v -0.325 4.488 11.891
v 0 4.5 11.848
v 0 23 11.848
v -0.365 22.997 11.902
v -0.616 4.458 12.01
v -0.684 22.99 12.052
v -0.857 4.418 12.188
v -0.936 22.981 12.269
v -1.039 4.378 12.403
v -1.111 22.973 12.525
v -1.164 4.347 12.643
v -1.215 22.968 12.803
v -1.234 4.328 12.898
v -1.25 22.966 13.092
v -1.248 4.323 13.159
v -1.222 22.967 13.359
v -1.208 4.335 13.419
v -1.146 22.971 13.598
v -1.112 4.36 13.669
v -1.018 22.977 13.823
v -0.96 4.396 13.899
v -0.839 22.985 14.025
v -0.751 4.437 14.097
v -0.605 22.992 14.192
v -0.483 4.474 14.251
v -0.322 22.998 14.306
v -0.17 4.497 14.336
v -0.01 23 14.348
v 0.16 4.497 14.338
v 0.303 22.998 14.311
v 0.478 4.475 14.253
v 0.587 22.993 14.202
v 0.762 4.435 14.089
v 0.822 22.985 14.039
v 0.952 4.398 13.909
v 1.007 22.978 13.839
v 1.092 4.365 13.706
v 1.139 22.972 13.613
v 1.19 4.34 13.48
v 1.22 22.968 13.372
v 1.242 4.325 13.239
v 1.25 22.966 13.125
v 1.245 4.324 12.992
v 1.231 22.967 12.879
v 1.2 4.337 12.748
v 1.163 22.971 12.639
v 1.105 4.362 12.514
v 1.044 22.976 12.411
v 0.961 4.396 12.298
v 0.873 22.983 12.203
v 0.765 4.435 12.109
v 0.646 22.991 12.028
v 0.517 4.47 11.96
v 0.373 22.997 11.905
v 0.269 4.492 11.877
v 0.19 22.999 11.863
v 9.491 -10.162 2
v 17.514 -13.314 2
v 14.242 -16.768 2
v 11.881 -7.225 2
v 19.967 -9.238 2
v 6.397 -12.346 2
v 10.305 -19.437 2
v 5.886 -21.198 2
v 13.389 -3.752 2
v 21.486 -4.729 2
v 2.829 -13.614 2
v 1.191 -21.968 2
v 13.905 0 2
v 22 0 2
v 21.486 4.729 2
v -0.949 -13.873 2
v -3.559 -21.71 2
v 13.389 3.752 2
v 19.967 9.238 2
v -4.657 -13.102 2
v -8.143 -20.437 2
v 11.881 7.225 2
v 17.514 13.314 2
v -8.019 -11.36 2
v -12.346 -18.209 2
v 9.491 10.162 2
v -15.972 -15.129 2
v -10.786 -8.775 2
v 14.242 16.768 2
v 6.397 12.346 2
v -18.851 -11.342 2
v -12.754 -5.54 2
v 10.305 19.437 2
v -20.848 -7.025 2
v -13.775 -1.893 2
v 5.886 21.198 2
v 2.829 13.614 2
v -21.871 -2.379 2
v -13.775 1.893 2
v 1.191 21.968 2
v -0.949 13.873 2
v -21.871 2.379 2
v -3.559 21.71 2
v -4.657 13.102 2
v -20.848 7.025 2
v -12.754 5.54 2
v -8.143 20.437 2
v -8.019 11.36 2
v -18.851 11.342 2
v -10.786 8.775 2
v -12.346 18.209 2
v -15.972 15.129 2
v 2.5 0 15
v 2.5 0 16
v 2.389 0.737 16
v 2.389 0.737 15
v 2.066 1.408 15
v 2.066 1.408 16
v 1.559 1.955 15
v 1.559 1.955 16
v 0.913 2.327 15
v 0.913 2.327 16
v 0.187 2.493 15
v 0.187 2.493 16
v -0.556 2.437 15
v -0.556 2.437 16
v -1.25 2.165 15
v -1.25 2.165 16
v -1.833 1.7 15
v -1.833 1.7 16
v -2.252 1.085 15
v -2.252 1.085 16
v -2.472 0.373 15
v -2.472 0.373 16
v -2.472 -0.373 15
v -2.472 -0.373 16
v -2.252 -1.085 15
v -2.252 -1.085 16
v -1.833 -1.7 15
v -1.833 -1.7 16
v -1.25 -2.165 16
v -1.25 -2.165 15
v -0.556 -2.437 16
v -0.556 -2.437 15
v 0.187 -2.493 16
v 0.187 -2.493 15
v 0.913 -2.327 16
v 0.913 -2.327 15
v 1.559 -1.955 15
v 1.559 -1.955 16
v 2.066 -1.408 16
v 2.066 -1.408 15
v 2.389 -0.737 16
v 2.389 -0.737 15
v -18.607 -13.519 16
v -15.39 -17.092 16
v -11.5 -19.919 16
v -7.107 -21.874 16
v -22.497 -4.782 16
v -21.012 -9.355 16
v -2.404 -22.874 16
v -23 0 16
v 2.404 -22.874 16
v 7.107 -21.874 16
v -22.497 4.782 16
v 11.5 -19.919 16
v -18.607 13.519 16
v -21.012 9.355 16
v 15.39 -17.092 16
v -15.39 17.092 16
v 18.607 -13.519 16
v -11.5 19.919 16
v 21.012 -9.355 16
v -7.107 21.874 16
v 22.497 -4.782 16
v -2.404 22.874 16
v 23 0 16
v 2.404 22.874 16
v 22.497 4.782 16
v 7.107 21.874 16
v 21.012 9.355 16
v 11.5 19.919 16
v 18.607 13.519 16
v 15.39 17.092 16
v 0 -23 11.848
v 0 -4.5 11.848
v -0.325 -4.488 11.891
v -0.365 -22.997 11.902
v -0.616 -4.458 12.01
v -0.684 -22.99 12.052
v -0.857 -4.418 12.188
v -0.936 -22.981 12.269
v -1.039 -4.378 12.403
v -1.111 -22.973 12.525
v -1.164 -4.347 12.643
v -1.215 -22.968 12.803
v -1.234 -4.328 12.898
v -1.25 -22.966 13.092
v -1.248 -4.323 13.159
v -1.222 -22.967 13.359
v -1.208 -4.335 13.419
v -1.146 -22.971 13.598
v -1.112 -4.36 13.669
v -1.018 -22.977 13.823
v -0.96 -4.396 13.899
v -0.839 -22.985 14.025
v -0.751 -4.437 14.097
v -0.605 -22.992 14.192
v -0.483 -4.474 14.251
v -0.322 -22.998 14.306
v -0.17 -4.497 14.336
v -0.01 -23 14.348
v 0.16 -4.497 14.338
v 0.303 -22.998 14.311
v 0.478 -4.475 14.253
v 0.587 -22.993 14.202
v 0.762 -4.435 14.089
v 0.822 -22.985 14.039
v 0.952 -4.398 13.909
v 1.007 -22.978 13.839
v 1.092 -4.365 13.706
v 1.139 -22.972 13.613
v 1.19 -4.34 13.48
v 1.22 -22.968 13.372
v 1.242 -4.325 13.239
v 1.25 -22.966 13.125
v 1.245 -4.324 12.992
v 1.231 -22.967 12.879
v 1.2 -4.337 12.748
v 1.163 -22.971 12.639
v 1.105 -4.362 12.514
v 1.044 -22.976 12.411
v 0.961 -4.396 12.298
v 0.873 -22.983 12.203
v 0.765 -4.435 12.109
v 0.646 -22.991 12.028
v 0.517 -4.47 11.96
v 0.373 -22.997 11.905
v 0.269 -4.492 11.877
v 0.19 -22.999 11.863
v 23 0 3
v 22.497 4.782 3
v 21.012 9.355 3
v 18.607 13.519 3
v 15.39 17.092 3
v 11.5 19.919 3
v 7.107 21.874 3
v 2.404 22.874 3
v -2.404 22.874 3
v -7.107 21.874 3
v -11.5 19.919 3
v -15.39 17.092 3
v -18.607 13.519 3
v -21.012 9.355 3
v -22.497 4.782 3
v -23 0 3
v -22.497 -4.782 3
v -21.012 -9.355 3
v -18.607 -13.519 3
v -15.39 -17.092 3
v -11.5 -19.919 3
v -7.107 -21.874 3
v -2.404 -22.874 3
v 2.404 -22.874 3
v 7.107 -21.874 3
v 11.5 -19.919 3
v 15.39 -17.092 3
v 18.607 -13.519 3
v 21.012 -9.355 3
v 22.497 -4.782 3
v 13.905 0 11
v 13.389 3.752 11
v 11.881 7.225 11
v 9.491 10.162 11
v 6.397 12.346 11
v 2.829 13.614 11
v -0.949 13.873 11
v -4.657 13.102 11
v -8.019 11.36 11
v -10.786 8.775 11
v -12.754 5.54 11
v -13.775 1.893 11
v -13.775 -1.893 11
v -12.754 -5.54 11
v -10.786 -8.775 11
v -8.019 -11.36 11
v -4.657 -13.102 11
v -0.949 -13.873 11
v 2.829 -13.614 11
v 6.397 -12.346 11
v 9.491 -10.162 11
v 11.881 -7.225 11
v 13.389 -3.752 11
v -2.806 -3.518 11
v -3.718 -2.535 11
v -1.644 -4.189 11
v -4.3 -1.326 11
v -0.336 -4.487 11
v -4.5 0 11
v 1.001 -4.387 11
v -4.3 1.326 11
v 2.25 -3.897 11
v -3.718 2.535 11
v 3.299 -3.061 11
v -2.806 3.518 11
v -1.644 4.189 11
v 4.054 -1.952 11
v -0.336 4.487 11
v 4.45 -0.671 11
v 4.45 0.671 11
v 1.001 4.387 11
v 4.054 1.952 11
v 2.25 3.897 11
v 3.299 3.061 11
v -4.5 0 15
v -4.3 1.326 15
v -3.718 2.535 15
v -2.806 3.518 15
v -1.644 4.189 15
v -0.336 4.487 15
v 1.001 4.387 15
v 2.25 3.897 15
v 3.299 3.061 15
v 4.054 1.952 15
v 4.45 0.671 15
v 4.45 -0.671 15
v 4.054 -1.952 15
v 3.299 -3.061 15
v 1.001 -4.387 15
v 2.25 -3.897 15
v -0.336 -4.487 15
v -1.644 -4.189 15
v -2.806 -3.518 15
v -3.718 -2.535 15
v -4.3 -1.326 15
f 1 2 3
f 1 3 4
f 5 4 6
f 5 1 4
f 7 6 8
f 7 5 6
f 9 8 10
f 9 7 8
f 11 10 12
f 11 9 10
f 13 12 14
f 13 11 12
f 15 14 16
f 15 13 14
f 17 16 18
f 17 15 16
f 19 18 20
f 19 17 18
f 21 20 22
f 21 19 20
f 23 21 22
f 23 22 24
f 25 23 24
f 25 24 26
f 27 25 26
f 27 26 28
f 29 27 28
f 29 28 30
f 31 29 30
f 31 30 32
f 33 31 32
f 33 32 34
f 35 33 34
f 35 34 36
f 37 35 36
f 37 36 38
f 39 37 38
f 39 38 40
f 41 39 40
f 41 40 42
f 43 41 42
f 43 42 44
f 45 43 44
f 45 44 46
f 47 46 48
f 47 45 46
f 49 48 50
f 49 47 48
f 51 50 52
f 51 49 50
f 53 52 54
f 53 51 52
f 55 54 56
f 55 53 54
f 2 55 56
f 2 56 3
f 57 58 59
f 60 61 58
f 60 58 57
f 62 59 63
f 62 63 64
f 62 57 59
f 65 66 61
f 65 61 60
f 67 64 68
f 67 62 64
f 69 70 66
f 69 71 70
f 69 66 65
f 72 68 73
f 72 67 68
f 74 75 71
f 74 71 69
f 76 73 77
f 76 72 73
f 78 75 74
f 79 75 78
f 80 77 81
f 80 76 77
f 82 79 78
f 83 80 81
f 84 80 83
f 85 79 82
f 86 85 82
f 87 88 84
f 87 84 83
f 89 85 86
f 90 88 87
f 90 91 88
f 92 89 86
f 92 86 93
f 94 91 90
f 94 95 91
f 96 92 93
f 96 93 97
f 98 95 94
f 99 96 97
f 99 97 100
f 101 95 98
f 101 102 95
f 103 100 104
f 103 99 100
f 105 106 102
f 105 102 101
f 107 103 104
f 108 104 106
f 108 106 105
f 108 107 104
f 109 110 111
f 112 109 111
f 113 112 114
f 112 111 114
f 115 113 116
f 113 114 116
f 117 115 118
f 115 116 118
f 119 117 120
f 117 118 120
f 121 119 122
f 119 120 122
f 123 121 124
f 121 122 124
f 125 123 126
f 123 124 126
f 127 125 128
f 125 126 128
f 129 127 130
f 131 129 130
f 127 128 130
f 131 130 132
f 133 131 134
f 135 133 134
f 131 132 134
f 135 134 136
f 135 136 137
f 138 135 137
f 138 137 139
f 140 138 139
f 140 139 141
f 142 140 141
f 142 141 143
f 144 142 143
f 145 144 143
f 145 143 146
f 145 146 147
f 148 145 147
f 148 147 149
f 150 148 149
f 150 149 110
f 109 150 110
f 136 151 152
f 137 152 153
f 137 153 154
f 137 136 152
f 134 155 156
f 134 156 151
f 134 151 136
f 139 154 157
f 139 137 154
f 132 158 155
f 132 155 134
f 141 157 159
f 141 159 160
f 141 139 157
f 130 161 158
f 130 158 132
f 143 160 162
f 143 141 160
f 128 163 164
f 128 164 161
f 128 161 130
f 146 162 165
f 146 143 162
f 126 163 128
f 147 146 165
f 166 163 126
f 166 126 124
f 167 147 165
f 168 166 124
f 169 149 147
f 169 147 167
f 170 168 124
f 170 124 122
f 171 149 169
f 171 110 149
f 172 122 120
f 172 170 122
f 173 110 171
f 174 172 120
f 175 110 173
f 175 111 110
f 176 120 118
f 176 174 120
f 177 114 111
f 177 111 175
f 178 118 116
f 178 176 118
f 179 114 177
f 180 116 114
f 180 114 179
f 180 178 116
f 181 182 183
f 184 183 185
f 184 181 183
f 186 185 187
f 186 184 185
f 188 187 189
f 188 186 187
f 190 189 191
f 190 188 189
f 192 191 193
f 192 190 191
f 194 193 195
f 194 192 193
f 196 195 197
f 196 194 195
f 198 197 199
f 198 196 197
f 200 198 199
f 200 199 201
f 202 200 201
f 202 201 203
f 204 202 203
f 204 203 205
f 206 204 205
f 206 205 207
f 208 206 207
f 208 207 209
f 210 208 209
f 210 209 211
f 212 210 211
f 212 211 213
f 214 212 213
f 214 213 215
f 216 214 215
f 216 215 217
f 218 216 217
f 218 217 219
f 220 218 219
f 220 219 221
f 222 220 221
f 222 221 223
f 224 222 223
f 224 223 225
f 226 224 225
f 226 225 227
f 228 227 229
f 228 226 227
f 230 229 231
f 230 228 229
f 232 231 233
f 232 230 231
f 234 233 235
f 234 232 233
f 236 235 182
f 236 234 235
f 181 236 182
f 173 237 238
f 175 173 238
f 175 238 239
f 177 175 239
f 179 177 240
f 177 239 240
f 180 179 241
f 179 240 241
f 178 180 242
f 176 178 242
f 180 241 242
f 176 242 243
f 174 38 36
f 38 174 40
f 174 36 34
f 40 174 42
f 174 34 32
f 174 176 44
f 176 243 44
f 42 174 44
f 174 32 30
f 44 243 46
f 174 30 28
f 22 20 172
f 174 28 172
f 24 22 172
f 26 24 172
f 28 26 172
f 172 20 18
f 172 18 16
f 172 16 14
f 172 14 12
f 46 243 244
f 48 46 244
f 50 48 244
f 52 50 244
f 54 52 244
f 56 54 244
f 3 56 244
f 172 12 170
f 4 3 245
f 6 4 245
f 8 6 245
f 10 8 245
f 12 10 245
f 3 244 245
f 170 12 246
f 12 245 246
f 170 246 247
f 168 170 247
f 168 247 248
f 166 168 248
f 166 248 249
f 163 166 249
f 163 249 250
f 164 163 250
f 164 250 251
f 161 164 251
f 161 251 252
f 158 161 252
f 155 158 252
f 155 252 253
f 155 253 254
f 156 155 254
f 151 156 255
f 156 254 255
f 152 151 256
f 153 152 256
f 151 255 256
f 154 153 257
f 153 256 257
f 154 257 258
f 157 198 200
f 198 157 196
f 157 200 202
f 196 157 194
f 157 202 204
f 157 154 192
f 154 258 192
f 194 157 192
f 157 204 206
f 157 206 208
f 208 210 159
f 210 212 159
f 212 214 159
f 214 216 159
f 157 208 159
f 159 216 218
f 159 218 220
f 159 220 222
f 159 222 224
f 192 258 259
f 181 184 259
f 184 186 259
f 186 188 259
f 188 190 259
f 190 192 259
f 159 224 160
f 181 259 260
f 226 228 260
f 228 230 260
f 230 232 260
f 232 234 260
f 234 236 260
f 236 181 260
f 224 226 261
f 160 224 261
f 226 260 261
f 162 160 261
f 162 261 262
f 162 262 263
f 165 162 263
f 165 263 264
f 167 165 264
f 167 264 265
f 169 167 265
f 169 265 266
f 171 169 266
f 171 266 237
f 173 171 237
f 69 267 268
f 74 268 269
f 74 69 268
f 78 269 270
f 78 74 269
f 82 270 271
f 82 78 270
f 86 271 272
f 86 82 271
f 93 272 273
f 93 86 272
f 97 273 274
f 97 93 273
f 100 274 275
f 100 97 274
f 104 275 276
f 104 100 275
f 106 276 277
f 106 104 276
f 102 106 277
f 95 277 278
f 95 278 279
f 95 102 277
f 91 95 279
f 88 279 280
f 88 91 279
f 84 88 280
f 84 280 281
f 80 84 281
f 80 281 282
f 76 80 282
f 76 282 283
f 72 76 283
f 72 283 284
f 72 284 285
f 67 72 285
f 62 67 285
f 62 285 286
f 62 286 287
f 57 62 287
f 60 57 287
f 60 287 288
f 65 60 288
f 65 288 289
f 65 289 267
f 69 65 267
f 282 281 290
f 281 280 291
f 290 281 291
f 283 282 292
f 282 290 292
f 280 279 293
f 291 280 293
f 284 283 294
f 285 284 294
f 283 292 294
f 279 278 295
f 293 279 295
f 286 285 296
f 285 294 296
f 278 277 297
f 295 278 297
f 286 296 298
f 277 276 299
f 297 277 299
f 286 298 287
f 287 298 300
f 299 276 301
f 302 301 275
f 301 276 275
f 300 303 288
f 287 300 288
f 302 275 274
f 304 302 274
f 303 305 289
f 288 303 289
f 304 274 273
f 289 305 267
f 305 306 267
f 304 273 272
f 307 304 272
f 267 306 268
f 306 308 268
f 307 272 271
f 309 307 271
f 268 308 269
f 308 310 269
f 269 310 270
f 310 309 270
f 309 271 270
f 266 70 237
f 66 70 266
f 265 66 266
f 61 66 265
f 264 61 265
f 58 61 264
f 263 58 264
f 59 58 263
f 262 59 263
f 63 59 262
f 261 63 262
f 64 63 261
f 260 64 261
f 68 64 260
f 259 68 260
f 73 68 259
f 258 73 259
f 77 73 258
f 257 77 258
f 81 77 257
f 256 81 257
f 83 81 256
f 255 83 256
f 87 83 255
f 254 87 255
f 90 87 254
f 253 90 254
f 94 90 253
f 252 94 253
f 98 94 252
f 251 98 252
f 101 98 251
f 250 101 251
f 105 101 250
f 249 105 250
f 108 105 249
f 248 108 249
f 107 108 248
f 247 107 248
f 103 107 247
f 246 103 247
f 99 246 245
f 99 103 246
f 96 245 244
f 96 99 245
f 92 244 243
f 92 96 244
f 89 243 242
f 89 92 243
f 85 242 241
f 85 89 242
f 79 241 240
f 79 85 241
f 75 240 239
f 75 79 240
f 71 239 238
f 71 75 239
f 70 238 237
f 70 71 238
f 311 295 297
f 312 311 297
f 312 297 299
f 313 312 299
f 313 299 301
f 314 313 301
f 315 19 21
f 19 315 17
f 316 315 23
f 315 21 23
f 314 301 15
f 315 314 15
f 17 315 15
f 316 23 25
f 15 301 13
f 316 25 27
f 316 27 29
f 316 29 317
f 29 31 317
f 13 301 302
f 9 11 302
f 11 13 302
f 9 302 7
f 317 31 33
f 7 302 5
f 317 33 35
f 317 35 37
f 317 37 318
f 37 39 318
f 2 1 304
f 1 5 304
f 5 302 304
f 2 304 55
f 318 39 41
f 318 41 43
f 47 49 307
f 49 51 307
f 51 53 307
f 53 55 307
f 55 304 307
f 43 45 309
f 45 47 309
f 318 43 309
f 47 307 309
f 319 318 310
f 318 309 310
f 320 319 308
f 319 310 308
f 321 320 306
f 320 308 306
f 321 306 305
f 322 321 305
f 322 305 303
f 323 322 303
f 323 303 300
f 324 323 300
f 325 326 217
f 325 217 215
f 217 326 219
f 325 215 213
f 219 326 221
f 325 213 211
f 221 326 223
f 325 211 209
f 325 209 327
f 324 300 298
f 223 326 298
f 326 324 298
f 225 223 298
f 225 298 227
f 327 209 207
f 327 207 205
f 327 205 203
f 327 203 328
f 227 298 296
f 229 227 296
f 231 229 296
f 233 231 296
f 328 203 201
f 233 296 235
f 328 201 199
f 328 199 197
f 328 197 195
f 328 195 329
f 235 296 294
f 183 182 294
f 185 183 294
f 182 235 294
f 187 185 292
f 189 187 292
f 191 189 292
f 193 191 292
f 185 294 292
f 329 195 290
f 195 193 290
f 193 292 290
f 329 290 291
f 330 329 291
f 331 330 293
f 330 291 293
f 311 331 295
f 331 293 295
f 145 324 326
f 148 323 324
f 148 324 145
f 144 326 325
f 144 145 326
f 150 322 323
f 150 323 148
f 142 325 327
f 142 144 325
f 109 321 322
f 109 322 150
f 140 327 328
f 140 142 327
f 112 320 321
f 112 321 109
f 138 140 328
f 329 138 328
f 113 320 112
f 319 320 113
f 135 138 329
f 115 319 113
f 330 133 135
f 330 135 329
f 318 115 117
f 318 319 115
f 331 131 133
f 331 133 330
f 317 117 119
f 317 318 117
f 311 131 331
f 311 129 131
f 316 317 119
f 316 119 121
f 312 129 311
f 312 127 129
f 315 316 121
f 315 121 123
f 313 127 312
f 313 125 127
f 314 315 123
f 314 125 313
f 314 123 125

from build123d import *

# Parameters (mm, degrees)
ESBO_O1_R                  = 23
ESBO_O1_R_2                = 13.905
RESSALTO_EXTRUS_O1_DEPTH   = 11
ESBO_O2_R                  = 23
RESSALTO_EXTRUS_O2_DEPTH   = 5
ESBO_O3_R                  = 2.5
CORTE_EXTRUS_O1_DEPTH      = 18
ESBO_O4_R                  = 4.5
CORTE_EXTRUS_O2_DEPTH      = 4
ESBO_O6_R                  = 24.343049023
CORTE_EXTRUS_O4_DEPTH      = 2
CHANFRO1_SIZE              = 1
CORTE_EXTRUS_O5_DEPTH      = 30
CORTE_EXTRUS_O5_DEPTH_BACK = 31
ESBO_O7_R                  = 1.25


with BuildPart() as part:
    # Esboço1 → Ressalto-extrusão1 (new body)
    with BuildSketch(Plane.XY):
        Circle(ESBO_O1_R)
        Circle(ESBO_O1_R_2, mode=Mode.SUBTRACT)
    extrude(amount=RESSALTO_EXTRUS_O1_DEPTH)

    # Esboço2 → Ressalto-extrusão2 (add)
    with BuildSketch(Plane.XY.offset(11)):
        Circle(ESBO_O2_R)
    extrude(amount=RESSALTO_EXTRUS_O2_DEPTH)

    # Esboço3 → Corte-extrusão1 (cut)
    with BuildSketch(Plane.XY.offset(16)):
        Circle(ESBO_O3_R)
    extrude(amount=-CORTE_EXTRUS_O1_DEPTH, mode=Mode.SUBTRACT)

    # Esboço4 → Corte-extrusão2 (cut)
    with BuildSketch(Plane(origin=(0, 0, 11), x_dir=(-1, 0, 0), z_dir=(0, 0, -1))):
        Circle(ESBO_O4_R)
    extrude(amount=-CORTE_EXTRUS_O2_DEPTH, mode=Mode.SUBTRACT)

    # Esboço6 → Corte-extrusão4 (cut)
    with BuildSketch(Plane(origin=(0, 0, 0), x_dir=(-1, 0, 0), z_dir=(0, 0, -1))):
        Circle(ESBO_O6_R)
    extrude(amount=-CORTE_EXTRUS_O4_DEPTH, mode=Mode.SUBTRACT)

    # Chanfro1
    chanfro1_edges = [part.edges().sort_by_distance(p)[0] for p in [
        (-23, 0, 2),
    ]]
    chamfer(chanfro1_edges, length=CHANFRO1_SIZE)

    # Esboço7 → Corte-extrusão5 (cut, two sides: drawn at the far end of the back side and taken through both)
    with BuildSketch(Plane(origin=(0, 0, 0), x_dir=(1, 0, 0), z_dir=(0, 1, 0)).offset(-CORTE_EXTRUS_O5_DEPTH_BACK)):
        with Locations(Location((0, -13.09796997, 0), (0, 0, 90))):
            Circle(ESBO_O7_R)
    extrude(amount=CORTE_EXTRUS_O5_DEPTH + CORTE_EXTRUS_O5_DEPTH_BACK, mode=Mode.SUBTRACT)


solid = part.part
